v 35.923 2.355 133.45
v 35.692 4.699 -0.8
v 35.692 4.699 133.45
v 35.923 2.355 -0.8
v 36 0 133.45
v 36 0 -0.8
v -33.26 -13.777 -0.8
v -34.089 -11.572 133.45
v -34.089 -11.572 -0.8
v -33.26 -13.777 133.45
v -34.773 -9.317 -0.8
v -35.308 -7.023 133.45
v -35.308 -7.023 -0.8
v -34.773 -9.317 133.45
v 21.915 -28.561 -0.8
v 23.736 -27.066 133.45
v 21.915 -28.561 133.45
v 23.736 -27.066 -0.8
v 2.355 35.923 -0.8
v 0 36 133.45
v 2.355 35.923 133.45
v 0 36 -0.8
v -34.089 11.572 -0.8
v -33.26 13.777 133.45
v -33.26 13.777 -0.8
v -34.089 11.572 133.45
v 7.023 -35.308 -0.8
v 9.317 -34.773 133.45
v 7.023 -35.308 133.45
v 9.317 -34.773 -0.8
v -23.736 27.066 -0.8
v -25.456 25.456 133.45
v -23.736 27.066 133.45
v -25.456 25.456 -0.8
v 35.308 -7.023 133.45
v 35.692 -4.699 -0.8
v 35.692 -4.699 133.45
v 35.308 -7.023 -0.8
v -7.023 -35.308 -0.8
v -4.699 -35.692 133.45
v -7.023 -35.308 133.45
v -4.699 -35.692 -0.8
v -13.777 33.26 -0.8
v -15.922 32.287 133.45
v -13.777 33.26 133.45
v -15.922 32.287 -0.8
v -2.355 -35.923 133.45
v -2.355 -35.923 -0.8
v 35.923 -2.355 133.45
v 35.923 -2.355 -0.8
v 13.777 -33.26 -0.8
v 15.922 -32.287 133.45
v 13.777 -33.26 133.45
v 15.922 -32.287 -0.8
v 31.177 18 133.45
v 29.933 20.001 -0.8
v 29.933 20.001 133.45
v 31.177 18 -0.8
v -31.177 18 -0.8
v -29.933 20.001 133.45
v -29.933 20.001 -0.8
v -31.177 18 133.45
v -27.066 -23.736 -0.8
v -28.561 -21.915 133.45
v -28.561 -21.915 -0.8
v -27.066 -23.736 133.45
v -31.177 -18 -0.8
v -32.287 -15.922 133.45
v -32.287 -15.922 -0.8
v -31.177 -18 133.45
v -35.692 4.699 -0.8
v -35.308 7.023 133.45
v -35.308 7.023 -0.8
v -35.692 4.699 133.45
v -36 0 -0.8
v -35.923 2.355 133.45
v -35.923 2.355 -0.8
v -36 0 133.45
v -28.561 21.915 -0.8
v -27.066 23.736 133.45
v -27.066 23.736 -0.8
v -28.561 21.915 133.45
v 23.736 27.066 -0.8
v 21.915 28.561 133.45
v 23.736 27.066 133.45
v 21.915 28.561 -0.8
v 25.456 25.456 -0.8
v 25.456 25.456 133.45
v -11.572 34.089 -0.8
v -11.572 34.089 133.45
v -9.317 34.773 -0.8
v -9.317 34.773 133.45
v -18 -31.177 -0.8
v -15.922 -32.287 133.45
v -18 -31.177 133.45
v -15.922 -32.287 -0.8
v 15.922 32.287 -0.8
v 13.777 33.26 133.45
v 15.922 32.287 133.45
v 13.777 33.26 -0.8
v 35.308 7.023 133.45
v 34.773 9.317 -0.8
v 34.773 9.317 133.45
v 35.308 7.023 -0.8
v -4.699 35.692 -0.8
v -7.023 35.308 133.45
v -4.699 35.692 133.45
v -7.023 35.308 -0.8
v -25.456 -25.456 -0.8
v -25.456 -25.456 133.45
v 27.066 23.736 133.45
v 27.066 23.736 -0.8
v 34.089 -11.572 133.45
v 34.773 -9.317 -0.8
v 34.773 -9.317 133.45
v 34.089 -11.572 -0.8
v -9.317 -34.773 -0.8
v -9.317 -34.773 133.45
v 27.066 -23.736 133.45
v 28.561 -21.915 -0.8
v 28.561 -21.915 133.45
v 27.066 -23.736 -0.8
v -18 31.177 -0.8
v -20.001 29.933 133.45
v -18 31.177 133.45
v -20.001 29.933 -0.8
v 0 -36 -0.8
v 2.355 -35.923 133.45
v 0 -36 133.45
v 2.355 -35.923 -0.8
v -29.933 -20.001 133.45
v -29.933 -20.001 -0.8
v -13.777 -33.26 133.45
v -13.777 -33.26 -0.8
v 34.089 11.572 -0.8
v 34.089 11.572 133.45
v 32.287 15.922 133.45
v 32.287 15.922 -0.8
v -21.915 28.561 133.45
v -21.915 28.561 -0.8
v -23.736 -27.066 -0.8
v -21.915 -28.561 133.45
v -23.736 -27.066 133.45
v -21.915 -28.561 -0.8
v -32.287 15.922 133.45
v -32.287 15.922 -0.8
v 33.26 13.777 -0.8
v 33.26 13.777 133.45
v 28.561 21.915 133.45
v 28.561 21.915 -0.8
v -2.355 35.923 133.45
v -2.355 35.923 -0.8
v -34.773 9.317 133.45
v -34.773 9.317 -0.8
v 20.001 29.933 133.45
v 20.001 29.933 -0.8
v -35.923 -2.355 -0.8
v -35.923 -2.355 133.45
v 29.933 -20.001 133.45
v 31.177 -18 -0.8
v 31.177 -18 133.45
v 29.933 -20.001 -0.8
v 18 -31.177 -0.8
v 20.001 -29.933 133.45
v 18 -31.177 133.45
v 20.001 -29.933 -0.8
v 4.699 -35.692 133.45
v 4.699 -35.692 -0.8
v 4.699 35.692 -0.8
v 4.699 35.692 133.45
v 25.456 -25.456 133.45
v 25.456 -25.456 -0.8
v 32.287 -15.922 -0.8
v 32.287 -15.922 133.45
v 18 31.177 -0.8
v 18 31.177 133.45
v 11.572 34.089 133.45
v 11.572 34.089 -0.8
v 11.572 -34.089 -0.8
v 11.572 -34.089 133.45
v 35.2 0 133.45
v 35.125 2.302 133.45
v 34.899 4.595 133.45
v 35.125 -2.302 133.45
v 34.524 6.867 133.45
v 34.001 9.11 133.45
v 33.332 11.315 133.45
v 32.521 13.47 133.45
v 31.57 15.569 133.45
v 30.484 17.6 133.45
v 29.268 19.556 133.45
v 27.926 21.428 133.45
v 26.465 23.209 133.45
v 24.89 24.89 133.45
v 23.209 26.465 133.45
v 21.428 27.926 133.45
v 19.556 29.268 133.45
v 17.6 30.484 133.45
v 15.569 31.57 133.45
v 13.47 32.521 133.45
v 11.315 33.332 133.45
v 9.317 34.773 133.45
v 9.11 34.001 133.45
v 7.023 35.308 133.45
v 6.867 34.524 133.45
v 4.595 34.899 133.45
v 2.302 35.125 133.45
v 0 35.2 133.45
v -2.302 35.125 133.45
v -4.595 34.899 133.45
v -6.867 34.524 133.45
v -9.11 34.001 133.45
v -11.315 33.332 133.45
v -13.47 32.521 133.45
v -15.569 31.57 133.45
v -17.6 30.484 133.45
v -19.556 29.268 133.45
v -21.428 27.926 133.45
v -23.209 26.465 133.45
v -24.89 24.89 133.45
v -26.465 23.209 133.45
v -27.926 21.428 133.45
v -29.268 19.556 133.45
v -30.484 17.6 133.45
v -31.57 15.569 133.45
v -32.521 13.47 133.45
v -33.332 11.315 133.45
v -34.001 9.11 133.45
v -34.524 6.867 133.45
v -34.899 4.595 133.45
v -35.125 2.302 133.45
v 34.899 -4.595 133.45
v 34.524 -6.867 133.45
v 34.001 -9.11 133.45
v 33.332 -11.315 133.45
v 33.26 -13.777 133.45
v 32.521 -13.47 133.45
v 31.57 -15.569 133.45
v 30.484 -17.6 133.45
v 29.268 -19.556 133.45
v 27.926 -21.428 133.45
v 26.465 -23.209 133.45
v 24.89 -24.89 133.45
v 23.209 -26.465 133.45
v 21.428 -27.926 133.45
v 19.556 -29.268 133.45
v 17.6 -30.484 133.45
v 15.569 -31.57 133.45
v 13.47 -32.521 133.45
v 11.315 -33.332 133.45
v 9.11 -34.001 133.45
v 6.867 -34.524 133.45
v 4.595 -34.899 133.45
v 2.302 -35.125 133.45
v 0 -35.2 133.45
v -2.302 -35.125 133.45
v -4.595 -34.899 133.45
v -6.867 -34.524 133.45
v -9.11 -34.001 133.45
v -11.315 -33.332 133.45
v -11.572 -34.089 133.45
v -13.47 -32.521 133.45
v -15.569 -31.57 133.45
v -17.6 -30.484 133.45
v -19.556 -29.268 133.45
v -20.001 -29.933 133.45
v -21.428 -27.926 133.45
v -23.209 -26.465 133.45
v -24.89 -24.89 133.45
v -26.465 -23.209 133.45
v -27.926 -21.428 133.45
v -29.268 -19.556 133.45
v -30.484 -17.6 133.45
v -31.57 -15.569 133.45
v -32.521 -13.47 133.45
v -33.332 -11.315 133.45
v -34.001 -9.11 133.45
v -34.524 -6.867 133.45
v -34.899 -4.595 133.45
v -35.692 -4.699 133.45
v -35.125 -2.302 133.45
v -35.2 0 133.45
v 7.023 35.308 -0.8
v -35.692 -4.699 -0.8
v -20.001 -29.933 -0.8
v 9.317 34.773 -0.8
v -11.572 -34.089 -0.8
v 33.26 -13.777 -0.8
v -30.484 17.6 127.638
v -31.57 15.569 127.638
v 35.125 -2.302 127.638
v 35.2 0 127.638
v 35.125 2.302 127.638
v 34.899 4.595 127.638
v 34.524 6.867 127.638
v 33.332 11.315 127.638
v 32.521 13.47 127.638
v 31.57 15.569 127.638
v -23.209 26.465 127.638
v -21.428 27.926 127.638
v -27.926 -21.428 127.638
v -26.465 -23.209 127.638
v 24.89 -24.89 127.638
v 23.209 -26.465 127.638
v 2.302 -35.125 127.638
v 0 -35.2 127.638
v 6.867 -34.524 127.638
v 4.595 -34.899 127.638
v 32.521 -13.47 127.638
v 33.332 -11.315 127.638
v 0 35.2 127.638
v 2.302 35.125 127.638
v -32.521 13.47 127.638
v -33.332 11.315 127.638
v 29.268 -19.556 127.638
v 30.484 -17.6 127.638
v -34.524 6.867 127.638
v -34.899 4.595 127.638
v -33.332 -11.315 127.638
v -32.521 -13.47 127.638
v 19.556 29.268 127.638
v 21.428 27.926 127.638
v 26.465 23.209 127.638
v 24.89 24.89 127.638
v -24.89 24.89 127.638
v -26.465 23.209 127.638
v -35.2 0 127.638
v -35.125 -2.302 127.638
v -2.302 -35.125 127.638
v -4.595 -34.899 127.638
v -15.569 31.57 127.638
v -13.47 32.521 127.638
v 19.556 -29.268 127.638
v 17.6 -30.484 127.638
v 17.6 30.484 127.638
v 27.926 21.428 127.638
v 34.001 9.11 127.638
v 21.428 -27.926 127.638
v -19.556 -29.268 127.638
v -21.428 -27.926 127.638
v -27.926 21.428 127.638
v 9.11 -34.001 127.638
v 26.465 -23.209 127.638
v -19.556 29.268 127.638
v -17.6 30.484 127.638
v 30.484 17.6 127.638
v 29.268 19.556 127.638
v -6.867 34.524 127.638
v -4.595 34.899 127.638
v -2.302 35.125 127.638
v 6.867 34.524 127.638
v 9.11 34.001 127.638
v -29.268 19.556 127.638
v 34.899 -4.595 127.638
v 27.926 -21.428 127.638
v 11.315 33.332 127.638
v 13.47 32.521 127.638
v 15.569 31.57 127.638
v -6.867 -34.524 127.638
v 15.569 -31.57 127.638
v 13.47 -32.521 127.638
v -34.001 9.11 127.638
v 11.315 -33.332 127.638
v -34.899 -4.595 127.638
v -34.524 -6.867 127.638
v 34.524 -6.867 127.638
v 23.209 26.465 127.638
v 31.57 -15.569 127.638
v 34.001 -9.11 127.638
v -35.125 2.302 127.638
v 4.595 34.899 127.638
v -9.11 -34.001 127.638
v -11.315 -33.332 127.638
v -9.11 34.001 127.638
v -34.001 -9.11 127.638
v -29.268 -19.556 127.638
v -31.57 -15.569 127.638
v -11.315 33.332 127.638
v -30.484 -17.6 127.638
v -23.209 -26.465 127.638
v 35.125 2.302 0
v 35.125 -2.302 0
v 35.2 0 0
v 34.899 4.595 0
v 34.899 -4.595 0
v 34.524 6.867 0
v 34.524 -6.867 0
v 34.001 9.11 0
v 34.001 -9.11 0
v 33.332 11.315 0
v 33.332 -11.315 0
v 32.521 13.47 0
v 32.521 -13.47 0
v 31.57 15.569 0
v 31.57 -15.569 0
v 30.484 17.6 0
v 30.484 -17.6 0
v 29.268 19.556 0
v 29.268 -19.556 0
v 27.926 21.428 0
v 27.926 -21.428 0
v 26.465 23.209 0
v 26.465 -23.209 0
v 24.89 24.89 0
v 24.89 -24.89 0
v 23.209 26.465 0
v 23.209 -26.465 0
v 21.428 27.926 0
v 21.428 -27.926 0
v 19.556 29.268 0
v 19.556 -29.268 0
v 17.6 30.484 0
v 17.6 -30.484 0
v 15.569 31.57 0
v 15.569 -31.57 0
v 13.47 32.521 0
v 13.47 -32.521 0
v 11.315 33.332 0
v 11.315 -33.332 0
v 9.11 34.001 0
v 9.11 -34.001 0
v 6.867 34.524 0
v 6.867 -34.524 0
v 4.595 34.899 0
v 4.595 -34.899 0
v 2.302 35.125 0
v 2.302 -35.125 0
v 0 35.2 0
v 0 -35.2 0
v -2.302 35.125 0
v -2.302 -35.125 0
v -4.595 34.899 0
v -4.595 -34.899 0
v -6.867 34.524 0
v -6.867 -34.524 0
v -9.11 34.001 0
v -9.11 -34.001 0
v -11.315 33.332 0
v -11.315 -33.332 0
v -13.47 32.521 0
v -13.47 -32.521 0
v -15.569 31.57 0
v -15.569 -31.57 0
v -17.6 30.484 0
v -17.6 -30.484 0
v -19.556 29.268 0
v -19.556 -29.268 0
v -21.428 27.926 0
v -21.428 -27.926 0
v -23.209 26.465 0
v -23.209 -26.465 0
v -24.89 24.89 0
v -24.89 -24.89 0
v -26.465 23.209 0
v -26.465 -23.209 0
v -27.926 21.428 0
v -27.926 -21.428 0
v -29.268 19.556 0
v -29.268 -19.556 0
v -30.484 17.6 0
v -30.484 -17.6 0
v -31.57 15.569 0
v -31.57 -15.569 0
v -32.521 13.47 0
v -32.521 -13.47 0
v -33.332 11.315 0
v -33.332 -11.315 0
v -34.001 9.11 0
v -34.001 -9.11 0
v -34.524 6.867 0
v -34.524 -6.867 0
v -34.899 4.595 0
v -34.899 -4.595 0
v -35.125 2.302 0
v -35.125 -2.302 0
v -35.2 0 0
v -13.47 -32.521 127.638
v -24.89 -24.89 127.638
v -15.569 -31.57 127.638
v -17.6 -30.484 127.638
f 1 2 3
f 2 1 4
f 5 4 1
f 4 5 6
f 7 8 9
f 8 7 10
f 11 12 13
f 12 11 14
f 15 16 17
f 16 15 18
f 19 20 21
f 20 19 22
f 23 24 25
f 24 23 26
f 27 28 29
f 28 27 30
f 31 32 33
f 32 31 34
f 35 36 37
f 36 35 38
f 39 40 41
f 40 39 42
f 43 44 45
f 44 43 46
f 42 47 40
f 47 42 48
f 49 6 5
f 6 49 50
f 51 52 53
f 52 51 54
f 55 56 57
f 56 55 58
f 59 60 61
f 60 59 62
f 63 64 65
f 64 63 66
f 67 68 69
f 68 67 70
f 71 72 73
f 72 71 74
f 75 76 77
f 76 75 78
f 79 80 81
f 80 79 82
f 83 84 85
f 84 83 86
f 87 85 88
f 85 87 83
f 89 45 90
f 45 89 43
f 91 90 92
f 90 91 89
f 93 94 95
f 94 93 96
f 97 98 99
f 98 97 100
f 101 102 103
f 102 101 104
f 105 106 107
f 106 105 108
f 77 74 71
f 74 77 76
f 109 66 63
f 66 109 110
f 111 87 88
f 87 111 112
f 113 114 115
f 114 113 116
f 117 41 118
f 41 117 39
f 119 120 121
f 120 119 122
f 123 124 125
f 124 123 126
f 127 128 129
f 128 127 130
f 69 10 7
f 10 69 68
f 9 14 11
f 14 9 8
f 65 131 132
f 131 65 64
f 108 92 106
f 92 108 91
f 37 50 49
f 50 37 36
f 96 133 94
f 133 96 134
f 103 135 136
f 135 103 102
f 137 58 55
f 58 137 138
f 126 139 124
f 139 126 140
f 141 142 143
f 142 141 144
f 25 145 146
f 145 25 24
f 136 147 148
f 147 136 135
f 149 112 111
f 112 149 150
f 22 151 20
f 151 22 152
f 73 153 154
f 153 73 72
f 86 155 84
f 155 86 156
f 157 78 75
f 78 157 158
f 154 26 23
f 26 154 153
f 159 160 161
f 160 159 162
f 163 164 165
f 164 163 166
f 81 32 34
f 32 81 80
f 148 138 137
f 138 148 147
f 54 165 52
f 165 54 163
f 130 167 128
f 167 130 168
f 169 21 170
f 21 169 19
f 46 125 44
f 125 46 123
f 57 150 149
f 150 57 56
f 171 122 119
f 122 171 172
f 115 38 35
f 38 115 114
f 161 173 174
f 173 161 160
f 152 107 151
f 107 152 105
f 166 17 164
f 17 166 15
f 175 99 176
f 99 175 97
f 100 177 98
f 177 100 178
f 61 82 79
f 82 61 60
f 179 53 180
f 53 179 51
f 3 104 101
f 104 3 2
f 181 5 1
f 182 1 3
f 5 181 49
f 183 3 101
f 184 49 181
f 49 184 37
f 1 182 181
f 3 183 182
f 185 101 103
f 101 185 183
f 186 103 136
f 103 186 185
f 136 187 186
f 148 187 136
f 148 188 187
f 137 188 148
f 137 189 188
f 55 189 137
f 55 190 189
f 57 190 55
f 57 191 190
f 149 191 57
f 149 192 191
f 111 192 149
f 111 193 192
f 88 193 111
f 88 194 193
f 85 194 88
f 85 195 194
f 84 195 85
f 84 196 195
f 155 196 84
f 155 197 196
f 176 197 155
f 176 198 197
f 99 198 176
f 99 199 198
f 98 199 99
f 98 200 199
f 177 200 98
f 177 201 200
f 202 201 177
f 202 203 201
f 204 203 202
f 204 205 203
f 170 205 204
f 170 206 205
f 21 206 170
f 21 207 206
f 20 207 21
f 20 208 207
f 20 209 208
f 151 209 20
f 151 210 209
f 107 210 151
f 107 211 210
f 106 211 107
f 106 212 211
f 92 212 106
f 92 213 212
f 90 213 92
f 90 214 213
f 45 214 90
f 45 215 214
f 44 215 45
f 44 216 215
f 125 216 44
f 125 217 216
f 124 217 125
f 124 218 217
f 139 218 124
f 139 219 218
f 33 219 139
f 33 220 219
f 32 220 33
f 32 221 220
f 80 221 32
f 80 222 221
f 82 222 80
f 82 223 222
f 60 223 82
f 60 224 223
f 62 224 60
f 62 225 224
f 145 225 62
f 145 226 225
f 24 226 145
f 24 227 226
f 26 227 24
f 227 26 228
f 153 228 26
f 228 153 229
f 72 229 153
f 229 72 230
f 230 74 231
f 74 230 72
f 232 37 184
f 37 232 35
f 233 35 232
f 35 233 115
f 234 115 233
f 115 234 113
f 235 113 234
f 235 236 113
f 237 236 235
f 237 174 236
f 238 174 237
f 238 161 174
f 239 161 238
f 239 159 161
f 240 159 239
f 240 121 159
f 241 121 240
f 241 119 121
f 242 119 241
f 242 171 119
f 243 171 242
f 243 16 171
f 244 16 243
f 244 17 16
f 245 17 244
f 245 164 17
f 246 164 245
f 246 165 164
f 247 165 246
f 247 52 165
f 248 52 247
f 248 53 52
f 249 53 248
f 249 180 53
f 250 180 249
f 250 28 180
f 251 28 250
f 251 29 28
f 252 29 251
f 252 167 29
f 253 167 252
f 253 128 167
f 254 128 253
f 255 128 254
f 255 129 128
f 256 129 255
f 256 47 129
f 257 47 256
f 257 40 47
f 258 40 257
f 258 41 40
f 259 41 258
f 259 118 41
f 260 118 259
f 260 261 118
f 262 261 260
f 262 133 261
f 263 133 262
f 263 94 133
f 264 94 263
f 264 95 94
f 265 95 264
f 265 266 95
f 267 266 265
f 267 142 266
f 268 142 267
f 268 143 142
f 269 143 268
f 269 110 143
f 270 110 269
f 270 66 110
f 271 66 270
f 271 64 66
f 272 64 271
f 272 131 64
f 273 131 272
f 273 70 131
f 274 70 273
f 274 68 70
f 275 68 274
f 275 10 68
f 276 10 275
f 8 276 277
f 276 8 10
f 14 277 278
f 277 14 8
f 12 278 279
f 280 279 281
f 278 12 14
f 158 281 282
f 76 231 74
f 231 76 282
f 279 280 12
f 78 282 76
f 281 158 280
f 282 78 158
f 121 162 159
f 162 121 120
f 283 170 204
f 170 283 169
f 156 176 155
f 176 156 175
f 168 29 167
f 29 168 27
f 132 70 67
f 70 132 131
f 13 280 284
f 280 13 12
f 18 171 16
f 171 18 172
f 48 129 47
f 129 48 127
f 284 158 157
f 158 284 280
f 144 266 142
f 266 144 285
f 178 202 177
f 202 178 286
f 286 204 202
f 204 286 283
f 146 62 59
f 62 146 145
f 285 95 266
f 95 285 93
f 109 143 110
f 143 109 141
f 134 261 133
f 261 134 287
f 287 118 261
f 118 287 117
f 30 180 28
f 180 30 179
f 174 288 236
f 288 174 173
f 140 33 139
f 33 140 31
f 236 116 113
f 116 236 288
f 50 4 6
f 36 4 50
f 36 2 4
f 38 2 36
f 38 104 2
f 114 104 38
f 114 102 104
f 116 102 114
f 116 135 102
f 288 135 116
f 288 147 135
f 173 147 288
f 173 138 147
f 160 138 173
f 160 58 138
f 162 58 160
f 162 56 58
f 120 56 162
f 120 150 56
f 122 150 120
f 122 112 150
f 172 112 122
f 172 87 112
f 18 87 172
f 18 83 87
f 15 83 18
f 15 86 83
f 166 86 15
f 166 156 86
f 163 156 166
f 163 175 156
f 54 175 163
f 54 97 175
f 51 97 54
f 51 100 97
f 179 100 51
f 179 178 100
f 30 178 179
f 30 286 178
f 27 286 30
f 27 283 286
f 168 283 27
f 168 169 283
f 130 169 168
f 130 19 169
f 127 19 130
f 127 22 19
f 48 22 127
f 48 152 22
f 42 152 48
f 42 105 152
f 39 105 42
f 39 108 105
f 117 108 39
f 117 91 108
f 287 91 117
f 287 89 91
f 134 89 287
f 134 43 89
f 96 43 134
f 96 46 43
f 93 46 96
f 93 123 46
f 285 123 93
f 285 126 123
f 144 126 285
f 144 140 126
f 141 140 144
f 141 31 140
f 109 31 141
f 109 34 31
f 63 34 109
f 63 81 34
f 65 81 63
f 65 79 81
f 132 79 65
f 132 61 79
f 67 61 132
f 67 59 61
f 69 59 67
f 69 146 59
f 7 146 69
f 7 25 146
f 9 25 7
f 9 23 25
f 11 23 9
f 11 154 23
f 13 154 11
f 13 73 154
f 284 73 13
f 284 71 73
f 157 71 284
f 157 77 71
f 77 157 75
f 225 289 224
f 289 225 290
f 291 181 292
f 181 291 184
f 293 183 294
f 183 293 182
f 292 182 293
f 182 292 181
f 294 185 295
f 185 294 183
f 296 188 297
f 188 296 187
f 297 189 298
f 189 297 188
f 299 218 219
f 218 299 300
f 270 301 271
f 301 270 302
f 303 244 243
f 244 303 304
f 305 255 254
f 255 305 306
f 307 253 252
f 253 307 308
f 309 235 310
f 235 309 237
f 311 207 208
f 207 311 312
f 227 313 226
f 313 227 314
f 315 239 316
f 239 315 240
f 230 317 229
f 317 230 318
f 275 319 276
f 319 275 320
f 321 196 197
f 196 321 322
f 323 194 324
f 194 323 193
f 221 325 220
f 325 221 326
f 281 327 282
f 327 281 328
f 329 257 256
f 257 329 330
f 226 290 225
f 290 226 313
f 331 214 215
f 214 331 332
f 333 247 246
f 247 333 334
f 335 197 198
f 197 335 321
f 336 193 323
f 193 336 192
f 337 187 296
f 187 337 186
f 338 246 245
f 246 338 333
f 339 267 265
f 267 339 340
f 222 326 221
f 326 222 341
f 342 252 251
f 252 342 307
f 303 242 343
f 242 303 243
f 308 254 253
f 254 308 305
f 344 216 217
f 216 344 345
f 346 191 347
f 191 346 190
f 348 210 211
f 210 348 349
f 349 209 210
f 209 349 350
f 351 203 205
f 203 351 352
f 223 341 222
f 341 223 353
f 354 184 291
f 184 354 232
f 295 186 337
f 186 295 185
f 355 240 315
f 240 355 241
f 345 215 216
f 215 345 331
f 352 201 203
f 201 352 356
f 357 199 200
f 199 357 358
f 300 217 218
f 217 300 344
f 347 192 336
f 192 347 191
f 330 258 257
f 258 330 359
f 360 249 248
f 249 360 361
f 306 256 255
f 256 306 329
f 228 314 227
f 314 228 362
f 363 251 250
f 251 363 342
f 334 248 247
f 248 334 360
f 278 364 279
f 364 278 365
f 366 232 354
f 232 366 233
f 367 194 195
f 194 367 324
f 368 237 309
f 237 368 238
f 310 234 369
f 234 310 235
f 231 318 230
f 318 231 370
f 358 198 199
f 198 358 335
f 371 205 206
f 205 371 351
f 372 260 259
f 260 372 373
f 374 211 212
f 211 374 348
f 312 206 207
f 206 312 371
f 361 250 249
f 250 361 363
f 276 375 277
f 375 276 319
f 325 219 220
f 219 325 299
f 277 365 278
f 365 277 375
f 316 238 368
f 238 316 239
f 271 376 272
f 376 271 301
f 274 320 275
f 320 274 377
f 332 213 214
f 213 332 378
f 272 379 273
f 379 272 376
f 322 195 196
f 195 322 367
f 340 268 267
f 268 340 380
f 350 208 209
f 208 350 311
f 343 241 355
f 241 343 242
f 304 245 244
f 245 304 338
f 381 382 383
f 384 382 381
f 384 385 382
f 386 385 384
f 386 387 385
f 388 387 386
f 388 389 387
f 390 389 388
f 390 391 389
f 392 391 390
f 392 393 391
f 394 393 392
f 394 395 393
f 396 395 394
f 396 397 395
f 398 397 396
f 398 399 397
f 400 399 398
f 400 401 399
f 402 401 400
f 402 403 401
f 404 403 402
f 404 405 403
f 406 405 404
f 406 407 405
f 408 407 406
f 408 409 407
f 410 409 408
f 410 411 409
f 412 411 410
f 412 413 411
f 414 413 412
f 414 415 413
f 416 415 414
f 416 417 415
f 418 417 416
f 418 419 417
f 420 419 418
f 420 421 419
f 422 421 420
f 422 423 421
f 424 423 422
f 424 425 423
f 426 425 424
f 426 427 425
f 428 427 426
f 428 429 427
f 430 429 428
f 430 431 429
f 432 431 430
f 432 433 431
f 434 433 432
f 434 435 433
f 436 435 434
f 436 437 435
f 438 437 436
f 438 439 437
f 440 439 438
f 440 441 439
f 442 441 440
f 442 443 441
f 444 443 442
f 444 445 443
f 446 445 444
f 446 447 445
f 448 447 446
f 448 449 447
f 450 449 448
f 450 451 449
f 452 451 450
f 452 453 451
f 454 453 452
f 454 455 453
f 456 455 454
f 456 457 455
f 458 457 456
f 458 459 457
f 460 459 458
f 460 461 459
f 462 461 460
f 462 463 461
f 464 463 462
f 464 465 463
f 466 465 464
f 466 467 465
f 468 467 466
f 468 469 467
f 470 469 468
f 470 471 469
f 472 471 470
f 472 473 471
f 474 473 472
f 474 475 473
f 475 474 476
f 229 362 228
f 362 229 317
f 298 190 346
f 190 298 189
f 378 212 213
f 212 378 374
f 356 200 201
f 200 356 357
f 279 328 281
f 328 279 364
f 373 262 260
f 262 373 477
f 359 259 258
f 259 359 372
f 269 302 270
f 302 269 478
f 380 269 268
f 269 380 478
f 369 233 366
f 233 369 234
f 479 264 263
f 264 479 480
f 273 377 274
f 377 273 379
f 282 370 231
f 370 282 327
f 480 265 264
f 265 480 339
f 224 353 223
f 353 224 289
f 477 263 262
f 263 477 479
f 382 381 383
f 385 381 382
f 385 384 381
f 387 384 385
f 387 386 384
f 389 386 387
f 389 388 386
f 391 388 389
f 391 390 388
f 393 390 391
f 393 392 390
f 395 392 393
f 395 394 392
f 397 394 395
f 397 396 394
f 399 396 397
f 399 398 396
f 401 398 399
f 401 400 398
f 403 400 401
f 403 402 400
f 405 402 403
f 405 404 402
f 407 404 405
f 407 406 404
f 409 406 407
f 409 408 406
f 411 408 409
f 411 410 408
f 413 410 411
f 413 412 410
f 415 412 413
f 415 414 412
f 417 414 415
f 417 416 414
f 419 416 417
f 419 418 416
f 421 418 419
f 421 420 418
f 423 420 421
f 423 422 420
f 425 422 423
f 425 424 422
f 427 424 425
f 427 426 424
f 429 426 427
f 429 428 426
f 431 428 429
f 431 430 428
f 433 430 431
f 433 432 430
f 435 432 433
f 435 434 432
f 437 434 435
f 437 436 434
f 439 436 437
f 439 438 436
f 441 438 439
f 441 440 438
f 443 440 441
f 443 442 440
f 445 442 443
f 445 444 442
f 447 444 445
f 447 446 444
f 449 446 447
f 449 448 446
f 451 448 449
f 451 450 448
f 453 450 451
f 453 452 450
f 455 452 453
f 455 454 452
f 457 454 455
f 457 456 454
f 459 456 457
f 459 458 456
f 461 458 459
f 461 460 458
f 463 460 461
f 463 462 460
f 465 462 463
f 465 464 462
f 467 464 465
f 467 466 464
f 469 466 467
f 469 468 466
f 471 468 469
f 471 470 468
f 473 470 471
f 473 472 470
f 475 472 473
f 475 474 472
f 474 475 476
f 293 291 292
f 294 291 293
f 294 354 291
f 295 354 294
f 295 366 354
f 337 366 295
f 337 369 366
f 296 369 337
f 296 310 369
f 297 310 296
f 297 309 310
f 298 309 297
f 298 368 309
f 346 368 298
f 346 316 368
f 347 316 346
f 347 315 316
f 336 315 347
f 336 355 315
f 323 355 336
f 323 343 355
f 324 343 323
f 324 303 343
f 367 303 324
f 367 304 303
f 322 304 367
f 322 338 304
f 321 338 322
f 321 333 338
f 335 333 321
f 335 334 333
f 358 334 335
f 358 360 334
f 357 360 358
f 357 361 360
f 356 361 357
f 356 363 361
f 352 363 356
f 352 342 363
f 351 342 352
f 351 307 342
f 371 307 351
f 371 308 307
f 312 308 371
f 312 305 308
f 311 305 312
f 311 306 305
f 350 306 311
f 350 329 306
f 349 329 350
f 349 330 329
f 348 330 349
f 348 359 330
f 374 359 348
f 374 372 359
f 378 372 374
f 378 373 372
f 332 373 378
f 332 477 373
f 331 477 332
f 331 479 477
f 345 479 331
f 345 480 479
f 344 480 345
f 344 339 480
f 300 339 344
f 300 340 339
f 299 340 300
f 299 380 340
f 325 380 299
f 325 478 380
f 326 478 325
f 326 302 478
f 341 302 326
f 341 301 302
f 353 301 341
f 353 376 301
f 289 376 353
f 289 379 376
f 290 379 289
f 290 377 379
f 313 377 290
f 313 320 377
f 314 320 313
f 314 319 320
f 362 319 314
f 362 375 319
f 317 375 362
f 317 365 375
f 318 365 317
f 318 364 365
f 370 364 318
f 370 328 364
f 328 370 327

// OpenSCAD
// SNSS 생리식염수병 결정 배터리 — 자동 생성 (snss_battery.cad). 단위 mm
$fn = 96;
bottle_d    = 72.0;
wall        = 0.8;
crystal_d   = 70.400;
crystal_h   = 127.638;  // 다듬은 결정 블록 (세포형 도메인 252층)
cut_z       = 134.250;         // 절단선 A (병 바닥에서)
show_bottle = true;

// 꺼낸 결정 블록 (아래면 = -, 윗면 = +)
color("steelblue", 0.9) cylinder(d = crystal_d, h = crystal_h);
// 절단선 A 아래 병 컵 (참고용)
if (show_bottle) translate([0, 0, -wall]) color("white", 0.25) difference() {
    cylinder(d = bottle_d, h = cut_z);
    translate([0, 0, wall]) cylinder(d = bottle_d - 2 * wall, h = cut_z);
}
